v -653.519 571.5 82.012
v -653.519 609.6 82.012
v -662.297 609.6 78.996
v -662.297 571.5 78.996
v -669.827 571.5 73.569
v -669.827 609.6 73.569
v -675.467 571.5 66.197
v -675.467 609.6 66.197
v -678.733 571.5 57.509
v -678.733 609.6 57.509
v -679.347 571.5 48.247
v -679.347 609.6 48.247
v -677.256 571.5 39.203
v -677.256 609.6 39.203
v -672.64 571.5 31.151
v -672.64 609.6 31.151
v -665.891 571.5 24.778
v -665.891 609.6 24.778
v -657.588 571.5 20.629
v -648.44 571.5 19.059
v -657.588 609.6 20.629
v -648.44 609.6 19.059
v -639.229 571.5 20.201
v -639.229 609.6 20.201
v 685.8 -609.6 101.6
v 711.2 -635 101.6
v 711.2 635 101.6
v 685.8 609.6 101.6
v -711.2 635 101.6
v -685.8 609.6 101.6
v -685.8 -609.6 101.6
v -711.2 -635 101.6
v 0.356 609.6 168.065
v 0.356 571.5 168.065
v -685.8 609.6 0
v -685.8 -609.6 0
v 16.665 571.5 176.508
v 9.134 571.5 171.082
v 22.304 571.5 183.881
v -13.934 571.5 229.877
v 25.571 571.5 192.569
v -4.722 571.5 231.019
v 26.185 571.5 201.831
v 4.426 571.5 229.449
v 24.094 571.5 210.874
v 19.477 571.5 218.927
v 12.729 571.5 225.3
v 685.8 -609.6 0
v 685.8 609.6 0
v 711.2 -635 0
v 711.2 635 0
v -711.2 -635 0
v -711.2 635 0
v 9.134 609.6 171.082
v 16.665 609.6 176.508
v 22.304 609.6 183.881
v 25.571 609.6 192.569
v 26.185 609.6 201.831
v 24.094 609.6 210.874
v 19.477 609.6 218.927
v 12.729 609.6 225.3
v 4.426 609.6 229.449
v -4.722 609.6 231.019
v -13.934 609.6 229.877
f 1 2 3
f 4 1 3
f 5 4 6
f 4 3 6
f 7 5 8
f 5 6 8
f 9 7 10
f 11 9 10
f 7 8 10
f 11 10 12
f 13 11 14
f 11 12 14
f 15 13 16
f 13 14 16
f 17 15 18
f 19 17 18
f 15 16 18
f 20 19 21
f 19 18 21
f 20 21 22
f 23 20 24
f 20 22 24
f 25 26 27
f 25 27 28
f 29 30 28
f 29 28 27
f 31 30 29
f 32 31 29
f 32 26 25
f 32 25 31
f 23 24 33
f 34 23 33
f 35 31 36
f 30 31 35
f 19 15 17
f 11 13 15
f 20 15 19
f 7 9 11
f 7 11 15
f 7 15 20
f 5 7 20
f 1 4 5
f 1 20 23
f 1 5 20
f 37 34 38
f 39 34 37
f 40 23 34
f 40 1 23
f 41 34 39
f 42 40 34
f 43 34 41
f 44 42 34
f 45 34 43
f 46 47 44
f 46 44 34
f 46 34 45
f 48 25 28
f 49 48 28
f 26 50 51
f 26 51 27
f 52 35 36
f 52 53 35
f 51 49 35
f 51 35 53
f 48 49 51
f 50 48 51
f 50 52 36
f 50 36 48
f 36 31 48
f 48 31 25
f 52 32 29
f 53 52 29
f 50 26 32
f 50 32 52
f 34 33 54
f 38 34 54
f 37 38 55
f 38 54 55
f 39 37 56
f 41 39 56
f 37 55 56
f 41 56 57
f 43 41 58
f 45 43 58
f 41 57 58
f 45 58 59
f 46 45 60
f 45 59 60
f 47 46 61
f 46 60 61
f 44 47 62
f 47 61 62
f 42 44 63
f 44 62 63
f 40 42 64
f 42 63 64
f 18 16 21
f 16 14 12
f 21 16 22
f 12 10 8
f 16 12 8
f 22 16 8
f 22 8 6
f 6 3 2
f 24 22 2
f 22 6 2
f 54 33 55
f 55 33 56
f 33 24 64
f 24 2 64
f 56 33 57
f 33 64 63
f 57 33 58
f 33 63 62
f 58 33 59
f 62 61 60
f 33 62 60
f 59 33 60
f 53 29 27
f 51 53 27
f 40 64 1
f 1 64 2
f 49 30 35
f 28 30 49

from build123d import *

# Parameters (mm, degrees)
F11_DEPTH = 38.1
F9_R      = 31.75
F12_DEPTH = 38.1
F4_W      = 1219.2
F4_H      = 101.6
F14_DEPTH = 25.4
F2_W      = 1397
F2_H      = 101.6
F15_DEPTH = 25.4
F16_DEPTH = 25.4
F17_DEPTH = 25.4


with BuildPart() as f11:
    # F10 (on offset) → F11 (new body)
    with BuildSketch(Plane.XZ.offset(-609.6)):
        with BuildLine():
            Line((-13.9338732219, 229.8766201204), (-653.518614158, 82.0122769))
            Line((-653.518614158, 82.0122769), (-639.2285902444, 20.201017717))
            Line((-639.2285902444, 20.201017717), (0.3561506917, 168.0653609375))
            ThreePointArc((0.3561506917, 168.0653609375), (-36.3965429187, 192.1260486131), (-13.9338732219, 229.8766201204))
        make_face()
        with BuildLine():
            ThreePointArc((26.2875365337, 199.2776378375), (13.7611579441, 224.5464898072), (-13.9338732219, 229.8766201204))
            ThreePointArc((-13.9338732219, 229.8766201204), (-36.3965429187, 192.1260486131), (0.3561506917, 168.0653609375))
            ThreePointArc((0.3561506917, 168.0653609375), (18.9588745347, 178.9882132463), (26.2875365337, 199.2776378375))
        make_face()
    extrude(amount=F11_DEPTH)

    # F9 (on face) → F12 (join)
    with BuildSketch(Plane.XZ.offset(-609.6)):
        with Locations((-647.7, 50.8)):
            Circle(F9_R)
    extrude(amount=F12_DEPTH)


with BuildPart() as f14:
    # F4 (on offset) → F14 (new body)
    with BuildSketch(Plane.YZ.offset(685.8)):
        with Locations((0, 50.8)):
            Rectangle(F4_W, F4_H)
    extrude(amount=F14_DEPTH)

    # F2 (on offset) → F15 (join)
    with BuildSketch(Plane.XZ.offset(609.6)):
        with Locations((12.7, 50.8)):
            Rectangle(F2_W, F2_H)
    extrude(amount=F15_DEPTH)

    # F8 (on offset) → F16 (join)
    with BuildSketch(Plane.YZ.offset(-685.8)):
        Polygon((-609.6, 0), (635, 0), (635, 101.6), (-609.6, 101.6), (-635, 101.6), (-635, 0), align=None)
    extrude(amount=-F16_DEPTH)

    # F7 (on offset) → F17 (join)
    with BuildSketch(Plane.XZ.offset(-609.6)):
        Polygon((-685.8, 0), (685.8, 0), (711.2, 0), (711.2, 101.6), (685.8, 101.6), (-685.8, 101.6), align=None)
    extrude(amount=-F17_DEPTH)


solid = Compound([f11.part, f14.part])
